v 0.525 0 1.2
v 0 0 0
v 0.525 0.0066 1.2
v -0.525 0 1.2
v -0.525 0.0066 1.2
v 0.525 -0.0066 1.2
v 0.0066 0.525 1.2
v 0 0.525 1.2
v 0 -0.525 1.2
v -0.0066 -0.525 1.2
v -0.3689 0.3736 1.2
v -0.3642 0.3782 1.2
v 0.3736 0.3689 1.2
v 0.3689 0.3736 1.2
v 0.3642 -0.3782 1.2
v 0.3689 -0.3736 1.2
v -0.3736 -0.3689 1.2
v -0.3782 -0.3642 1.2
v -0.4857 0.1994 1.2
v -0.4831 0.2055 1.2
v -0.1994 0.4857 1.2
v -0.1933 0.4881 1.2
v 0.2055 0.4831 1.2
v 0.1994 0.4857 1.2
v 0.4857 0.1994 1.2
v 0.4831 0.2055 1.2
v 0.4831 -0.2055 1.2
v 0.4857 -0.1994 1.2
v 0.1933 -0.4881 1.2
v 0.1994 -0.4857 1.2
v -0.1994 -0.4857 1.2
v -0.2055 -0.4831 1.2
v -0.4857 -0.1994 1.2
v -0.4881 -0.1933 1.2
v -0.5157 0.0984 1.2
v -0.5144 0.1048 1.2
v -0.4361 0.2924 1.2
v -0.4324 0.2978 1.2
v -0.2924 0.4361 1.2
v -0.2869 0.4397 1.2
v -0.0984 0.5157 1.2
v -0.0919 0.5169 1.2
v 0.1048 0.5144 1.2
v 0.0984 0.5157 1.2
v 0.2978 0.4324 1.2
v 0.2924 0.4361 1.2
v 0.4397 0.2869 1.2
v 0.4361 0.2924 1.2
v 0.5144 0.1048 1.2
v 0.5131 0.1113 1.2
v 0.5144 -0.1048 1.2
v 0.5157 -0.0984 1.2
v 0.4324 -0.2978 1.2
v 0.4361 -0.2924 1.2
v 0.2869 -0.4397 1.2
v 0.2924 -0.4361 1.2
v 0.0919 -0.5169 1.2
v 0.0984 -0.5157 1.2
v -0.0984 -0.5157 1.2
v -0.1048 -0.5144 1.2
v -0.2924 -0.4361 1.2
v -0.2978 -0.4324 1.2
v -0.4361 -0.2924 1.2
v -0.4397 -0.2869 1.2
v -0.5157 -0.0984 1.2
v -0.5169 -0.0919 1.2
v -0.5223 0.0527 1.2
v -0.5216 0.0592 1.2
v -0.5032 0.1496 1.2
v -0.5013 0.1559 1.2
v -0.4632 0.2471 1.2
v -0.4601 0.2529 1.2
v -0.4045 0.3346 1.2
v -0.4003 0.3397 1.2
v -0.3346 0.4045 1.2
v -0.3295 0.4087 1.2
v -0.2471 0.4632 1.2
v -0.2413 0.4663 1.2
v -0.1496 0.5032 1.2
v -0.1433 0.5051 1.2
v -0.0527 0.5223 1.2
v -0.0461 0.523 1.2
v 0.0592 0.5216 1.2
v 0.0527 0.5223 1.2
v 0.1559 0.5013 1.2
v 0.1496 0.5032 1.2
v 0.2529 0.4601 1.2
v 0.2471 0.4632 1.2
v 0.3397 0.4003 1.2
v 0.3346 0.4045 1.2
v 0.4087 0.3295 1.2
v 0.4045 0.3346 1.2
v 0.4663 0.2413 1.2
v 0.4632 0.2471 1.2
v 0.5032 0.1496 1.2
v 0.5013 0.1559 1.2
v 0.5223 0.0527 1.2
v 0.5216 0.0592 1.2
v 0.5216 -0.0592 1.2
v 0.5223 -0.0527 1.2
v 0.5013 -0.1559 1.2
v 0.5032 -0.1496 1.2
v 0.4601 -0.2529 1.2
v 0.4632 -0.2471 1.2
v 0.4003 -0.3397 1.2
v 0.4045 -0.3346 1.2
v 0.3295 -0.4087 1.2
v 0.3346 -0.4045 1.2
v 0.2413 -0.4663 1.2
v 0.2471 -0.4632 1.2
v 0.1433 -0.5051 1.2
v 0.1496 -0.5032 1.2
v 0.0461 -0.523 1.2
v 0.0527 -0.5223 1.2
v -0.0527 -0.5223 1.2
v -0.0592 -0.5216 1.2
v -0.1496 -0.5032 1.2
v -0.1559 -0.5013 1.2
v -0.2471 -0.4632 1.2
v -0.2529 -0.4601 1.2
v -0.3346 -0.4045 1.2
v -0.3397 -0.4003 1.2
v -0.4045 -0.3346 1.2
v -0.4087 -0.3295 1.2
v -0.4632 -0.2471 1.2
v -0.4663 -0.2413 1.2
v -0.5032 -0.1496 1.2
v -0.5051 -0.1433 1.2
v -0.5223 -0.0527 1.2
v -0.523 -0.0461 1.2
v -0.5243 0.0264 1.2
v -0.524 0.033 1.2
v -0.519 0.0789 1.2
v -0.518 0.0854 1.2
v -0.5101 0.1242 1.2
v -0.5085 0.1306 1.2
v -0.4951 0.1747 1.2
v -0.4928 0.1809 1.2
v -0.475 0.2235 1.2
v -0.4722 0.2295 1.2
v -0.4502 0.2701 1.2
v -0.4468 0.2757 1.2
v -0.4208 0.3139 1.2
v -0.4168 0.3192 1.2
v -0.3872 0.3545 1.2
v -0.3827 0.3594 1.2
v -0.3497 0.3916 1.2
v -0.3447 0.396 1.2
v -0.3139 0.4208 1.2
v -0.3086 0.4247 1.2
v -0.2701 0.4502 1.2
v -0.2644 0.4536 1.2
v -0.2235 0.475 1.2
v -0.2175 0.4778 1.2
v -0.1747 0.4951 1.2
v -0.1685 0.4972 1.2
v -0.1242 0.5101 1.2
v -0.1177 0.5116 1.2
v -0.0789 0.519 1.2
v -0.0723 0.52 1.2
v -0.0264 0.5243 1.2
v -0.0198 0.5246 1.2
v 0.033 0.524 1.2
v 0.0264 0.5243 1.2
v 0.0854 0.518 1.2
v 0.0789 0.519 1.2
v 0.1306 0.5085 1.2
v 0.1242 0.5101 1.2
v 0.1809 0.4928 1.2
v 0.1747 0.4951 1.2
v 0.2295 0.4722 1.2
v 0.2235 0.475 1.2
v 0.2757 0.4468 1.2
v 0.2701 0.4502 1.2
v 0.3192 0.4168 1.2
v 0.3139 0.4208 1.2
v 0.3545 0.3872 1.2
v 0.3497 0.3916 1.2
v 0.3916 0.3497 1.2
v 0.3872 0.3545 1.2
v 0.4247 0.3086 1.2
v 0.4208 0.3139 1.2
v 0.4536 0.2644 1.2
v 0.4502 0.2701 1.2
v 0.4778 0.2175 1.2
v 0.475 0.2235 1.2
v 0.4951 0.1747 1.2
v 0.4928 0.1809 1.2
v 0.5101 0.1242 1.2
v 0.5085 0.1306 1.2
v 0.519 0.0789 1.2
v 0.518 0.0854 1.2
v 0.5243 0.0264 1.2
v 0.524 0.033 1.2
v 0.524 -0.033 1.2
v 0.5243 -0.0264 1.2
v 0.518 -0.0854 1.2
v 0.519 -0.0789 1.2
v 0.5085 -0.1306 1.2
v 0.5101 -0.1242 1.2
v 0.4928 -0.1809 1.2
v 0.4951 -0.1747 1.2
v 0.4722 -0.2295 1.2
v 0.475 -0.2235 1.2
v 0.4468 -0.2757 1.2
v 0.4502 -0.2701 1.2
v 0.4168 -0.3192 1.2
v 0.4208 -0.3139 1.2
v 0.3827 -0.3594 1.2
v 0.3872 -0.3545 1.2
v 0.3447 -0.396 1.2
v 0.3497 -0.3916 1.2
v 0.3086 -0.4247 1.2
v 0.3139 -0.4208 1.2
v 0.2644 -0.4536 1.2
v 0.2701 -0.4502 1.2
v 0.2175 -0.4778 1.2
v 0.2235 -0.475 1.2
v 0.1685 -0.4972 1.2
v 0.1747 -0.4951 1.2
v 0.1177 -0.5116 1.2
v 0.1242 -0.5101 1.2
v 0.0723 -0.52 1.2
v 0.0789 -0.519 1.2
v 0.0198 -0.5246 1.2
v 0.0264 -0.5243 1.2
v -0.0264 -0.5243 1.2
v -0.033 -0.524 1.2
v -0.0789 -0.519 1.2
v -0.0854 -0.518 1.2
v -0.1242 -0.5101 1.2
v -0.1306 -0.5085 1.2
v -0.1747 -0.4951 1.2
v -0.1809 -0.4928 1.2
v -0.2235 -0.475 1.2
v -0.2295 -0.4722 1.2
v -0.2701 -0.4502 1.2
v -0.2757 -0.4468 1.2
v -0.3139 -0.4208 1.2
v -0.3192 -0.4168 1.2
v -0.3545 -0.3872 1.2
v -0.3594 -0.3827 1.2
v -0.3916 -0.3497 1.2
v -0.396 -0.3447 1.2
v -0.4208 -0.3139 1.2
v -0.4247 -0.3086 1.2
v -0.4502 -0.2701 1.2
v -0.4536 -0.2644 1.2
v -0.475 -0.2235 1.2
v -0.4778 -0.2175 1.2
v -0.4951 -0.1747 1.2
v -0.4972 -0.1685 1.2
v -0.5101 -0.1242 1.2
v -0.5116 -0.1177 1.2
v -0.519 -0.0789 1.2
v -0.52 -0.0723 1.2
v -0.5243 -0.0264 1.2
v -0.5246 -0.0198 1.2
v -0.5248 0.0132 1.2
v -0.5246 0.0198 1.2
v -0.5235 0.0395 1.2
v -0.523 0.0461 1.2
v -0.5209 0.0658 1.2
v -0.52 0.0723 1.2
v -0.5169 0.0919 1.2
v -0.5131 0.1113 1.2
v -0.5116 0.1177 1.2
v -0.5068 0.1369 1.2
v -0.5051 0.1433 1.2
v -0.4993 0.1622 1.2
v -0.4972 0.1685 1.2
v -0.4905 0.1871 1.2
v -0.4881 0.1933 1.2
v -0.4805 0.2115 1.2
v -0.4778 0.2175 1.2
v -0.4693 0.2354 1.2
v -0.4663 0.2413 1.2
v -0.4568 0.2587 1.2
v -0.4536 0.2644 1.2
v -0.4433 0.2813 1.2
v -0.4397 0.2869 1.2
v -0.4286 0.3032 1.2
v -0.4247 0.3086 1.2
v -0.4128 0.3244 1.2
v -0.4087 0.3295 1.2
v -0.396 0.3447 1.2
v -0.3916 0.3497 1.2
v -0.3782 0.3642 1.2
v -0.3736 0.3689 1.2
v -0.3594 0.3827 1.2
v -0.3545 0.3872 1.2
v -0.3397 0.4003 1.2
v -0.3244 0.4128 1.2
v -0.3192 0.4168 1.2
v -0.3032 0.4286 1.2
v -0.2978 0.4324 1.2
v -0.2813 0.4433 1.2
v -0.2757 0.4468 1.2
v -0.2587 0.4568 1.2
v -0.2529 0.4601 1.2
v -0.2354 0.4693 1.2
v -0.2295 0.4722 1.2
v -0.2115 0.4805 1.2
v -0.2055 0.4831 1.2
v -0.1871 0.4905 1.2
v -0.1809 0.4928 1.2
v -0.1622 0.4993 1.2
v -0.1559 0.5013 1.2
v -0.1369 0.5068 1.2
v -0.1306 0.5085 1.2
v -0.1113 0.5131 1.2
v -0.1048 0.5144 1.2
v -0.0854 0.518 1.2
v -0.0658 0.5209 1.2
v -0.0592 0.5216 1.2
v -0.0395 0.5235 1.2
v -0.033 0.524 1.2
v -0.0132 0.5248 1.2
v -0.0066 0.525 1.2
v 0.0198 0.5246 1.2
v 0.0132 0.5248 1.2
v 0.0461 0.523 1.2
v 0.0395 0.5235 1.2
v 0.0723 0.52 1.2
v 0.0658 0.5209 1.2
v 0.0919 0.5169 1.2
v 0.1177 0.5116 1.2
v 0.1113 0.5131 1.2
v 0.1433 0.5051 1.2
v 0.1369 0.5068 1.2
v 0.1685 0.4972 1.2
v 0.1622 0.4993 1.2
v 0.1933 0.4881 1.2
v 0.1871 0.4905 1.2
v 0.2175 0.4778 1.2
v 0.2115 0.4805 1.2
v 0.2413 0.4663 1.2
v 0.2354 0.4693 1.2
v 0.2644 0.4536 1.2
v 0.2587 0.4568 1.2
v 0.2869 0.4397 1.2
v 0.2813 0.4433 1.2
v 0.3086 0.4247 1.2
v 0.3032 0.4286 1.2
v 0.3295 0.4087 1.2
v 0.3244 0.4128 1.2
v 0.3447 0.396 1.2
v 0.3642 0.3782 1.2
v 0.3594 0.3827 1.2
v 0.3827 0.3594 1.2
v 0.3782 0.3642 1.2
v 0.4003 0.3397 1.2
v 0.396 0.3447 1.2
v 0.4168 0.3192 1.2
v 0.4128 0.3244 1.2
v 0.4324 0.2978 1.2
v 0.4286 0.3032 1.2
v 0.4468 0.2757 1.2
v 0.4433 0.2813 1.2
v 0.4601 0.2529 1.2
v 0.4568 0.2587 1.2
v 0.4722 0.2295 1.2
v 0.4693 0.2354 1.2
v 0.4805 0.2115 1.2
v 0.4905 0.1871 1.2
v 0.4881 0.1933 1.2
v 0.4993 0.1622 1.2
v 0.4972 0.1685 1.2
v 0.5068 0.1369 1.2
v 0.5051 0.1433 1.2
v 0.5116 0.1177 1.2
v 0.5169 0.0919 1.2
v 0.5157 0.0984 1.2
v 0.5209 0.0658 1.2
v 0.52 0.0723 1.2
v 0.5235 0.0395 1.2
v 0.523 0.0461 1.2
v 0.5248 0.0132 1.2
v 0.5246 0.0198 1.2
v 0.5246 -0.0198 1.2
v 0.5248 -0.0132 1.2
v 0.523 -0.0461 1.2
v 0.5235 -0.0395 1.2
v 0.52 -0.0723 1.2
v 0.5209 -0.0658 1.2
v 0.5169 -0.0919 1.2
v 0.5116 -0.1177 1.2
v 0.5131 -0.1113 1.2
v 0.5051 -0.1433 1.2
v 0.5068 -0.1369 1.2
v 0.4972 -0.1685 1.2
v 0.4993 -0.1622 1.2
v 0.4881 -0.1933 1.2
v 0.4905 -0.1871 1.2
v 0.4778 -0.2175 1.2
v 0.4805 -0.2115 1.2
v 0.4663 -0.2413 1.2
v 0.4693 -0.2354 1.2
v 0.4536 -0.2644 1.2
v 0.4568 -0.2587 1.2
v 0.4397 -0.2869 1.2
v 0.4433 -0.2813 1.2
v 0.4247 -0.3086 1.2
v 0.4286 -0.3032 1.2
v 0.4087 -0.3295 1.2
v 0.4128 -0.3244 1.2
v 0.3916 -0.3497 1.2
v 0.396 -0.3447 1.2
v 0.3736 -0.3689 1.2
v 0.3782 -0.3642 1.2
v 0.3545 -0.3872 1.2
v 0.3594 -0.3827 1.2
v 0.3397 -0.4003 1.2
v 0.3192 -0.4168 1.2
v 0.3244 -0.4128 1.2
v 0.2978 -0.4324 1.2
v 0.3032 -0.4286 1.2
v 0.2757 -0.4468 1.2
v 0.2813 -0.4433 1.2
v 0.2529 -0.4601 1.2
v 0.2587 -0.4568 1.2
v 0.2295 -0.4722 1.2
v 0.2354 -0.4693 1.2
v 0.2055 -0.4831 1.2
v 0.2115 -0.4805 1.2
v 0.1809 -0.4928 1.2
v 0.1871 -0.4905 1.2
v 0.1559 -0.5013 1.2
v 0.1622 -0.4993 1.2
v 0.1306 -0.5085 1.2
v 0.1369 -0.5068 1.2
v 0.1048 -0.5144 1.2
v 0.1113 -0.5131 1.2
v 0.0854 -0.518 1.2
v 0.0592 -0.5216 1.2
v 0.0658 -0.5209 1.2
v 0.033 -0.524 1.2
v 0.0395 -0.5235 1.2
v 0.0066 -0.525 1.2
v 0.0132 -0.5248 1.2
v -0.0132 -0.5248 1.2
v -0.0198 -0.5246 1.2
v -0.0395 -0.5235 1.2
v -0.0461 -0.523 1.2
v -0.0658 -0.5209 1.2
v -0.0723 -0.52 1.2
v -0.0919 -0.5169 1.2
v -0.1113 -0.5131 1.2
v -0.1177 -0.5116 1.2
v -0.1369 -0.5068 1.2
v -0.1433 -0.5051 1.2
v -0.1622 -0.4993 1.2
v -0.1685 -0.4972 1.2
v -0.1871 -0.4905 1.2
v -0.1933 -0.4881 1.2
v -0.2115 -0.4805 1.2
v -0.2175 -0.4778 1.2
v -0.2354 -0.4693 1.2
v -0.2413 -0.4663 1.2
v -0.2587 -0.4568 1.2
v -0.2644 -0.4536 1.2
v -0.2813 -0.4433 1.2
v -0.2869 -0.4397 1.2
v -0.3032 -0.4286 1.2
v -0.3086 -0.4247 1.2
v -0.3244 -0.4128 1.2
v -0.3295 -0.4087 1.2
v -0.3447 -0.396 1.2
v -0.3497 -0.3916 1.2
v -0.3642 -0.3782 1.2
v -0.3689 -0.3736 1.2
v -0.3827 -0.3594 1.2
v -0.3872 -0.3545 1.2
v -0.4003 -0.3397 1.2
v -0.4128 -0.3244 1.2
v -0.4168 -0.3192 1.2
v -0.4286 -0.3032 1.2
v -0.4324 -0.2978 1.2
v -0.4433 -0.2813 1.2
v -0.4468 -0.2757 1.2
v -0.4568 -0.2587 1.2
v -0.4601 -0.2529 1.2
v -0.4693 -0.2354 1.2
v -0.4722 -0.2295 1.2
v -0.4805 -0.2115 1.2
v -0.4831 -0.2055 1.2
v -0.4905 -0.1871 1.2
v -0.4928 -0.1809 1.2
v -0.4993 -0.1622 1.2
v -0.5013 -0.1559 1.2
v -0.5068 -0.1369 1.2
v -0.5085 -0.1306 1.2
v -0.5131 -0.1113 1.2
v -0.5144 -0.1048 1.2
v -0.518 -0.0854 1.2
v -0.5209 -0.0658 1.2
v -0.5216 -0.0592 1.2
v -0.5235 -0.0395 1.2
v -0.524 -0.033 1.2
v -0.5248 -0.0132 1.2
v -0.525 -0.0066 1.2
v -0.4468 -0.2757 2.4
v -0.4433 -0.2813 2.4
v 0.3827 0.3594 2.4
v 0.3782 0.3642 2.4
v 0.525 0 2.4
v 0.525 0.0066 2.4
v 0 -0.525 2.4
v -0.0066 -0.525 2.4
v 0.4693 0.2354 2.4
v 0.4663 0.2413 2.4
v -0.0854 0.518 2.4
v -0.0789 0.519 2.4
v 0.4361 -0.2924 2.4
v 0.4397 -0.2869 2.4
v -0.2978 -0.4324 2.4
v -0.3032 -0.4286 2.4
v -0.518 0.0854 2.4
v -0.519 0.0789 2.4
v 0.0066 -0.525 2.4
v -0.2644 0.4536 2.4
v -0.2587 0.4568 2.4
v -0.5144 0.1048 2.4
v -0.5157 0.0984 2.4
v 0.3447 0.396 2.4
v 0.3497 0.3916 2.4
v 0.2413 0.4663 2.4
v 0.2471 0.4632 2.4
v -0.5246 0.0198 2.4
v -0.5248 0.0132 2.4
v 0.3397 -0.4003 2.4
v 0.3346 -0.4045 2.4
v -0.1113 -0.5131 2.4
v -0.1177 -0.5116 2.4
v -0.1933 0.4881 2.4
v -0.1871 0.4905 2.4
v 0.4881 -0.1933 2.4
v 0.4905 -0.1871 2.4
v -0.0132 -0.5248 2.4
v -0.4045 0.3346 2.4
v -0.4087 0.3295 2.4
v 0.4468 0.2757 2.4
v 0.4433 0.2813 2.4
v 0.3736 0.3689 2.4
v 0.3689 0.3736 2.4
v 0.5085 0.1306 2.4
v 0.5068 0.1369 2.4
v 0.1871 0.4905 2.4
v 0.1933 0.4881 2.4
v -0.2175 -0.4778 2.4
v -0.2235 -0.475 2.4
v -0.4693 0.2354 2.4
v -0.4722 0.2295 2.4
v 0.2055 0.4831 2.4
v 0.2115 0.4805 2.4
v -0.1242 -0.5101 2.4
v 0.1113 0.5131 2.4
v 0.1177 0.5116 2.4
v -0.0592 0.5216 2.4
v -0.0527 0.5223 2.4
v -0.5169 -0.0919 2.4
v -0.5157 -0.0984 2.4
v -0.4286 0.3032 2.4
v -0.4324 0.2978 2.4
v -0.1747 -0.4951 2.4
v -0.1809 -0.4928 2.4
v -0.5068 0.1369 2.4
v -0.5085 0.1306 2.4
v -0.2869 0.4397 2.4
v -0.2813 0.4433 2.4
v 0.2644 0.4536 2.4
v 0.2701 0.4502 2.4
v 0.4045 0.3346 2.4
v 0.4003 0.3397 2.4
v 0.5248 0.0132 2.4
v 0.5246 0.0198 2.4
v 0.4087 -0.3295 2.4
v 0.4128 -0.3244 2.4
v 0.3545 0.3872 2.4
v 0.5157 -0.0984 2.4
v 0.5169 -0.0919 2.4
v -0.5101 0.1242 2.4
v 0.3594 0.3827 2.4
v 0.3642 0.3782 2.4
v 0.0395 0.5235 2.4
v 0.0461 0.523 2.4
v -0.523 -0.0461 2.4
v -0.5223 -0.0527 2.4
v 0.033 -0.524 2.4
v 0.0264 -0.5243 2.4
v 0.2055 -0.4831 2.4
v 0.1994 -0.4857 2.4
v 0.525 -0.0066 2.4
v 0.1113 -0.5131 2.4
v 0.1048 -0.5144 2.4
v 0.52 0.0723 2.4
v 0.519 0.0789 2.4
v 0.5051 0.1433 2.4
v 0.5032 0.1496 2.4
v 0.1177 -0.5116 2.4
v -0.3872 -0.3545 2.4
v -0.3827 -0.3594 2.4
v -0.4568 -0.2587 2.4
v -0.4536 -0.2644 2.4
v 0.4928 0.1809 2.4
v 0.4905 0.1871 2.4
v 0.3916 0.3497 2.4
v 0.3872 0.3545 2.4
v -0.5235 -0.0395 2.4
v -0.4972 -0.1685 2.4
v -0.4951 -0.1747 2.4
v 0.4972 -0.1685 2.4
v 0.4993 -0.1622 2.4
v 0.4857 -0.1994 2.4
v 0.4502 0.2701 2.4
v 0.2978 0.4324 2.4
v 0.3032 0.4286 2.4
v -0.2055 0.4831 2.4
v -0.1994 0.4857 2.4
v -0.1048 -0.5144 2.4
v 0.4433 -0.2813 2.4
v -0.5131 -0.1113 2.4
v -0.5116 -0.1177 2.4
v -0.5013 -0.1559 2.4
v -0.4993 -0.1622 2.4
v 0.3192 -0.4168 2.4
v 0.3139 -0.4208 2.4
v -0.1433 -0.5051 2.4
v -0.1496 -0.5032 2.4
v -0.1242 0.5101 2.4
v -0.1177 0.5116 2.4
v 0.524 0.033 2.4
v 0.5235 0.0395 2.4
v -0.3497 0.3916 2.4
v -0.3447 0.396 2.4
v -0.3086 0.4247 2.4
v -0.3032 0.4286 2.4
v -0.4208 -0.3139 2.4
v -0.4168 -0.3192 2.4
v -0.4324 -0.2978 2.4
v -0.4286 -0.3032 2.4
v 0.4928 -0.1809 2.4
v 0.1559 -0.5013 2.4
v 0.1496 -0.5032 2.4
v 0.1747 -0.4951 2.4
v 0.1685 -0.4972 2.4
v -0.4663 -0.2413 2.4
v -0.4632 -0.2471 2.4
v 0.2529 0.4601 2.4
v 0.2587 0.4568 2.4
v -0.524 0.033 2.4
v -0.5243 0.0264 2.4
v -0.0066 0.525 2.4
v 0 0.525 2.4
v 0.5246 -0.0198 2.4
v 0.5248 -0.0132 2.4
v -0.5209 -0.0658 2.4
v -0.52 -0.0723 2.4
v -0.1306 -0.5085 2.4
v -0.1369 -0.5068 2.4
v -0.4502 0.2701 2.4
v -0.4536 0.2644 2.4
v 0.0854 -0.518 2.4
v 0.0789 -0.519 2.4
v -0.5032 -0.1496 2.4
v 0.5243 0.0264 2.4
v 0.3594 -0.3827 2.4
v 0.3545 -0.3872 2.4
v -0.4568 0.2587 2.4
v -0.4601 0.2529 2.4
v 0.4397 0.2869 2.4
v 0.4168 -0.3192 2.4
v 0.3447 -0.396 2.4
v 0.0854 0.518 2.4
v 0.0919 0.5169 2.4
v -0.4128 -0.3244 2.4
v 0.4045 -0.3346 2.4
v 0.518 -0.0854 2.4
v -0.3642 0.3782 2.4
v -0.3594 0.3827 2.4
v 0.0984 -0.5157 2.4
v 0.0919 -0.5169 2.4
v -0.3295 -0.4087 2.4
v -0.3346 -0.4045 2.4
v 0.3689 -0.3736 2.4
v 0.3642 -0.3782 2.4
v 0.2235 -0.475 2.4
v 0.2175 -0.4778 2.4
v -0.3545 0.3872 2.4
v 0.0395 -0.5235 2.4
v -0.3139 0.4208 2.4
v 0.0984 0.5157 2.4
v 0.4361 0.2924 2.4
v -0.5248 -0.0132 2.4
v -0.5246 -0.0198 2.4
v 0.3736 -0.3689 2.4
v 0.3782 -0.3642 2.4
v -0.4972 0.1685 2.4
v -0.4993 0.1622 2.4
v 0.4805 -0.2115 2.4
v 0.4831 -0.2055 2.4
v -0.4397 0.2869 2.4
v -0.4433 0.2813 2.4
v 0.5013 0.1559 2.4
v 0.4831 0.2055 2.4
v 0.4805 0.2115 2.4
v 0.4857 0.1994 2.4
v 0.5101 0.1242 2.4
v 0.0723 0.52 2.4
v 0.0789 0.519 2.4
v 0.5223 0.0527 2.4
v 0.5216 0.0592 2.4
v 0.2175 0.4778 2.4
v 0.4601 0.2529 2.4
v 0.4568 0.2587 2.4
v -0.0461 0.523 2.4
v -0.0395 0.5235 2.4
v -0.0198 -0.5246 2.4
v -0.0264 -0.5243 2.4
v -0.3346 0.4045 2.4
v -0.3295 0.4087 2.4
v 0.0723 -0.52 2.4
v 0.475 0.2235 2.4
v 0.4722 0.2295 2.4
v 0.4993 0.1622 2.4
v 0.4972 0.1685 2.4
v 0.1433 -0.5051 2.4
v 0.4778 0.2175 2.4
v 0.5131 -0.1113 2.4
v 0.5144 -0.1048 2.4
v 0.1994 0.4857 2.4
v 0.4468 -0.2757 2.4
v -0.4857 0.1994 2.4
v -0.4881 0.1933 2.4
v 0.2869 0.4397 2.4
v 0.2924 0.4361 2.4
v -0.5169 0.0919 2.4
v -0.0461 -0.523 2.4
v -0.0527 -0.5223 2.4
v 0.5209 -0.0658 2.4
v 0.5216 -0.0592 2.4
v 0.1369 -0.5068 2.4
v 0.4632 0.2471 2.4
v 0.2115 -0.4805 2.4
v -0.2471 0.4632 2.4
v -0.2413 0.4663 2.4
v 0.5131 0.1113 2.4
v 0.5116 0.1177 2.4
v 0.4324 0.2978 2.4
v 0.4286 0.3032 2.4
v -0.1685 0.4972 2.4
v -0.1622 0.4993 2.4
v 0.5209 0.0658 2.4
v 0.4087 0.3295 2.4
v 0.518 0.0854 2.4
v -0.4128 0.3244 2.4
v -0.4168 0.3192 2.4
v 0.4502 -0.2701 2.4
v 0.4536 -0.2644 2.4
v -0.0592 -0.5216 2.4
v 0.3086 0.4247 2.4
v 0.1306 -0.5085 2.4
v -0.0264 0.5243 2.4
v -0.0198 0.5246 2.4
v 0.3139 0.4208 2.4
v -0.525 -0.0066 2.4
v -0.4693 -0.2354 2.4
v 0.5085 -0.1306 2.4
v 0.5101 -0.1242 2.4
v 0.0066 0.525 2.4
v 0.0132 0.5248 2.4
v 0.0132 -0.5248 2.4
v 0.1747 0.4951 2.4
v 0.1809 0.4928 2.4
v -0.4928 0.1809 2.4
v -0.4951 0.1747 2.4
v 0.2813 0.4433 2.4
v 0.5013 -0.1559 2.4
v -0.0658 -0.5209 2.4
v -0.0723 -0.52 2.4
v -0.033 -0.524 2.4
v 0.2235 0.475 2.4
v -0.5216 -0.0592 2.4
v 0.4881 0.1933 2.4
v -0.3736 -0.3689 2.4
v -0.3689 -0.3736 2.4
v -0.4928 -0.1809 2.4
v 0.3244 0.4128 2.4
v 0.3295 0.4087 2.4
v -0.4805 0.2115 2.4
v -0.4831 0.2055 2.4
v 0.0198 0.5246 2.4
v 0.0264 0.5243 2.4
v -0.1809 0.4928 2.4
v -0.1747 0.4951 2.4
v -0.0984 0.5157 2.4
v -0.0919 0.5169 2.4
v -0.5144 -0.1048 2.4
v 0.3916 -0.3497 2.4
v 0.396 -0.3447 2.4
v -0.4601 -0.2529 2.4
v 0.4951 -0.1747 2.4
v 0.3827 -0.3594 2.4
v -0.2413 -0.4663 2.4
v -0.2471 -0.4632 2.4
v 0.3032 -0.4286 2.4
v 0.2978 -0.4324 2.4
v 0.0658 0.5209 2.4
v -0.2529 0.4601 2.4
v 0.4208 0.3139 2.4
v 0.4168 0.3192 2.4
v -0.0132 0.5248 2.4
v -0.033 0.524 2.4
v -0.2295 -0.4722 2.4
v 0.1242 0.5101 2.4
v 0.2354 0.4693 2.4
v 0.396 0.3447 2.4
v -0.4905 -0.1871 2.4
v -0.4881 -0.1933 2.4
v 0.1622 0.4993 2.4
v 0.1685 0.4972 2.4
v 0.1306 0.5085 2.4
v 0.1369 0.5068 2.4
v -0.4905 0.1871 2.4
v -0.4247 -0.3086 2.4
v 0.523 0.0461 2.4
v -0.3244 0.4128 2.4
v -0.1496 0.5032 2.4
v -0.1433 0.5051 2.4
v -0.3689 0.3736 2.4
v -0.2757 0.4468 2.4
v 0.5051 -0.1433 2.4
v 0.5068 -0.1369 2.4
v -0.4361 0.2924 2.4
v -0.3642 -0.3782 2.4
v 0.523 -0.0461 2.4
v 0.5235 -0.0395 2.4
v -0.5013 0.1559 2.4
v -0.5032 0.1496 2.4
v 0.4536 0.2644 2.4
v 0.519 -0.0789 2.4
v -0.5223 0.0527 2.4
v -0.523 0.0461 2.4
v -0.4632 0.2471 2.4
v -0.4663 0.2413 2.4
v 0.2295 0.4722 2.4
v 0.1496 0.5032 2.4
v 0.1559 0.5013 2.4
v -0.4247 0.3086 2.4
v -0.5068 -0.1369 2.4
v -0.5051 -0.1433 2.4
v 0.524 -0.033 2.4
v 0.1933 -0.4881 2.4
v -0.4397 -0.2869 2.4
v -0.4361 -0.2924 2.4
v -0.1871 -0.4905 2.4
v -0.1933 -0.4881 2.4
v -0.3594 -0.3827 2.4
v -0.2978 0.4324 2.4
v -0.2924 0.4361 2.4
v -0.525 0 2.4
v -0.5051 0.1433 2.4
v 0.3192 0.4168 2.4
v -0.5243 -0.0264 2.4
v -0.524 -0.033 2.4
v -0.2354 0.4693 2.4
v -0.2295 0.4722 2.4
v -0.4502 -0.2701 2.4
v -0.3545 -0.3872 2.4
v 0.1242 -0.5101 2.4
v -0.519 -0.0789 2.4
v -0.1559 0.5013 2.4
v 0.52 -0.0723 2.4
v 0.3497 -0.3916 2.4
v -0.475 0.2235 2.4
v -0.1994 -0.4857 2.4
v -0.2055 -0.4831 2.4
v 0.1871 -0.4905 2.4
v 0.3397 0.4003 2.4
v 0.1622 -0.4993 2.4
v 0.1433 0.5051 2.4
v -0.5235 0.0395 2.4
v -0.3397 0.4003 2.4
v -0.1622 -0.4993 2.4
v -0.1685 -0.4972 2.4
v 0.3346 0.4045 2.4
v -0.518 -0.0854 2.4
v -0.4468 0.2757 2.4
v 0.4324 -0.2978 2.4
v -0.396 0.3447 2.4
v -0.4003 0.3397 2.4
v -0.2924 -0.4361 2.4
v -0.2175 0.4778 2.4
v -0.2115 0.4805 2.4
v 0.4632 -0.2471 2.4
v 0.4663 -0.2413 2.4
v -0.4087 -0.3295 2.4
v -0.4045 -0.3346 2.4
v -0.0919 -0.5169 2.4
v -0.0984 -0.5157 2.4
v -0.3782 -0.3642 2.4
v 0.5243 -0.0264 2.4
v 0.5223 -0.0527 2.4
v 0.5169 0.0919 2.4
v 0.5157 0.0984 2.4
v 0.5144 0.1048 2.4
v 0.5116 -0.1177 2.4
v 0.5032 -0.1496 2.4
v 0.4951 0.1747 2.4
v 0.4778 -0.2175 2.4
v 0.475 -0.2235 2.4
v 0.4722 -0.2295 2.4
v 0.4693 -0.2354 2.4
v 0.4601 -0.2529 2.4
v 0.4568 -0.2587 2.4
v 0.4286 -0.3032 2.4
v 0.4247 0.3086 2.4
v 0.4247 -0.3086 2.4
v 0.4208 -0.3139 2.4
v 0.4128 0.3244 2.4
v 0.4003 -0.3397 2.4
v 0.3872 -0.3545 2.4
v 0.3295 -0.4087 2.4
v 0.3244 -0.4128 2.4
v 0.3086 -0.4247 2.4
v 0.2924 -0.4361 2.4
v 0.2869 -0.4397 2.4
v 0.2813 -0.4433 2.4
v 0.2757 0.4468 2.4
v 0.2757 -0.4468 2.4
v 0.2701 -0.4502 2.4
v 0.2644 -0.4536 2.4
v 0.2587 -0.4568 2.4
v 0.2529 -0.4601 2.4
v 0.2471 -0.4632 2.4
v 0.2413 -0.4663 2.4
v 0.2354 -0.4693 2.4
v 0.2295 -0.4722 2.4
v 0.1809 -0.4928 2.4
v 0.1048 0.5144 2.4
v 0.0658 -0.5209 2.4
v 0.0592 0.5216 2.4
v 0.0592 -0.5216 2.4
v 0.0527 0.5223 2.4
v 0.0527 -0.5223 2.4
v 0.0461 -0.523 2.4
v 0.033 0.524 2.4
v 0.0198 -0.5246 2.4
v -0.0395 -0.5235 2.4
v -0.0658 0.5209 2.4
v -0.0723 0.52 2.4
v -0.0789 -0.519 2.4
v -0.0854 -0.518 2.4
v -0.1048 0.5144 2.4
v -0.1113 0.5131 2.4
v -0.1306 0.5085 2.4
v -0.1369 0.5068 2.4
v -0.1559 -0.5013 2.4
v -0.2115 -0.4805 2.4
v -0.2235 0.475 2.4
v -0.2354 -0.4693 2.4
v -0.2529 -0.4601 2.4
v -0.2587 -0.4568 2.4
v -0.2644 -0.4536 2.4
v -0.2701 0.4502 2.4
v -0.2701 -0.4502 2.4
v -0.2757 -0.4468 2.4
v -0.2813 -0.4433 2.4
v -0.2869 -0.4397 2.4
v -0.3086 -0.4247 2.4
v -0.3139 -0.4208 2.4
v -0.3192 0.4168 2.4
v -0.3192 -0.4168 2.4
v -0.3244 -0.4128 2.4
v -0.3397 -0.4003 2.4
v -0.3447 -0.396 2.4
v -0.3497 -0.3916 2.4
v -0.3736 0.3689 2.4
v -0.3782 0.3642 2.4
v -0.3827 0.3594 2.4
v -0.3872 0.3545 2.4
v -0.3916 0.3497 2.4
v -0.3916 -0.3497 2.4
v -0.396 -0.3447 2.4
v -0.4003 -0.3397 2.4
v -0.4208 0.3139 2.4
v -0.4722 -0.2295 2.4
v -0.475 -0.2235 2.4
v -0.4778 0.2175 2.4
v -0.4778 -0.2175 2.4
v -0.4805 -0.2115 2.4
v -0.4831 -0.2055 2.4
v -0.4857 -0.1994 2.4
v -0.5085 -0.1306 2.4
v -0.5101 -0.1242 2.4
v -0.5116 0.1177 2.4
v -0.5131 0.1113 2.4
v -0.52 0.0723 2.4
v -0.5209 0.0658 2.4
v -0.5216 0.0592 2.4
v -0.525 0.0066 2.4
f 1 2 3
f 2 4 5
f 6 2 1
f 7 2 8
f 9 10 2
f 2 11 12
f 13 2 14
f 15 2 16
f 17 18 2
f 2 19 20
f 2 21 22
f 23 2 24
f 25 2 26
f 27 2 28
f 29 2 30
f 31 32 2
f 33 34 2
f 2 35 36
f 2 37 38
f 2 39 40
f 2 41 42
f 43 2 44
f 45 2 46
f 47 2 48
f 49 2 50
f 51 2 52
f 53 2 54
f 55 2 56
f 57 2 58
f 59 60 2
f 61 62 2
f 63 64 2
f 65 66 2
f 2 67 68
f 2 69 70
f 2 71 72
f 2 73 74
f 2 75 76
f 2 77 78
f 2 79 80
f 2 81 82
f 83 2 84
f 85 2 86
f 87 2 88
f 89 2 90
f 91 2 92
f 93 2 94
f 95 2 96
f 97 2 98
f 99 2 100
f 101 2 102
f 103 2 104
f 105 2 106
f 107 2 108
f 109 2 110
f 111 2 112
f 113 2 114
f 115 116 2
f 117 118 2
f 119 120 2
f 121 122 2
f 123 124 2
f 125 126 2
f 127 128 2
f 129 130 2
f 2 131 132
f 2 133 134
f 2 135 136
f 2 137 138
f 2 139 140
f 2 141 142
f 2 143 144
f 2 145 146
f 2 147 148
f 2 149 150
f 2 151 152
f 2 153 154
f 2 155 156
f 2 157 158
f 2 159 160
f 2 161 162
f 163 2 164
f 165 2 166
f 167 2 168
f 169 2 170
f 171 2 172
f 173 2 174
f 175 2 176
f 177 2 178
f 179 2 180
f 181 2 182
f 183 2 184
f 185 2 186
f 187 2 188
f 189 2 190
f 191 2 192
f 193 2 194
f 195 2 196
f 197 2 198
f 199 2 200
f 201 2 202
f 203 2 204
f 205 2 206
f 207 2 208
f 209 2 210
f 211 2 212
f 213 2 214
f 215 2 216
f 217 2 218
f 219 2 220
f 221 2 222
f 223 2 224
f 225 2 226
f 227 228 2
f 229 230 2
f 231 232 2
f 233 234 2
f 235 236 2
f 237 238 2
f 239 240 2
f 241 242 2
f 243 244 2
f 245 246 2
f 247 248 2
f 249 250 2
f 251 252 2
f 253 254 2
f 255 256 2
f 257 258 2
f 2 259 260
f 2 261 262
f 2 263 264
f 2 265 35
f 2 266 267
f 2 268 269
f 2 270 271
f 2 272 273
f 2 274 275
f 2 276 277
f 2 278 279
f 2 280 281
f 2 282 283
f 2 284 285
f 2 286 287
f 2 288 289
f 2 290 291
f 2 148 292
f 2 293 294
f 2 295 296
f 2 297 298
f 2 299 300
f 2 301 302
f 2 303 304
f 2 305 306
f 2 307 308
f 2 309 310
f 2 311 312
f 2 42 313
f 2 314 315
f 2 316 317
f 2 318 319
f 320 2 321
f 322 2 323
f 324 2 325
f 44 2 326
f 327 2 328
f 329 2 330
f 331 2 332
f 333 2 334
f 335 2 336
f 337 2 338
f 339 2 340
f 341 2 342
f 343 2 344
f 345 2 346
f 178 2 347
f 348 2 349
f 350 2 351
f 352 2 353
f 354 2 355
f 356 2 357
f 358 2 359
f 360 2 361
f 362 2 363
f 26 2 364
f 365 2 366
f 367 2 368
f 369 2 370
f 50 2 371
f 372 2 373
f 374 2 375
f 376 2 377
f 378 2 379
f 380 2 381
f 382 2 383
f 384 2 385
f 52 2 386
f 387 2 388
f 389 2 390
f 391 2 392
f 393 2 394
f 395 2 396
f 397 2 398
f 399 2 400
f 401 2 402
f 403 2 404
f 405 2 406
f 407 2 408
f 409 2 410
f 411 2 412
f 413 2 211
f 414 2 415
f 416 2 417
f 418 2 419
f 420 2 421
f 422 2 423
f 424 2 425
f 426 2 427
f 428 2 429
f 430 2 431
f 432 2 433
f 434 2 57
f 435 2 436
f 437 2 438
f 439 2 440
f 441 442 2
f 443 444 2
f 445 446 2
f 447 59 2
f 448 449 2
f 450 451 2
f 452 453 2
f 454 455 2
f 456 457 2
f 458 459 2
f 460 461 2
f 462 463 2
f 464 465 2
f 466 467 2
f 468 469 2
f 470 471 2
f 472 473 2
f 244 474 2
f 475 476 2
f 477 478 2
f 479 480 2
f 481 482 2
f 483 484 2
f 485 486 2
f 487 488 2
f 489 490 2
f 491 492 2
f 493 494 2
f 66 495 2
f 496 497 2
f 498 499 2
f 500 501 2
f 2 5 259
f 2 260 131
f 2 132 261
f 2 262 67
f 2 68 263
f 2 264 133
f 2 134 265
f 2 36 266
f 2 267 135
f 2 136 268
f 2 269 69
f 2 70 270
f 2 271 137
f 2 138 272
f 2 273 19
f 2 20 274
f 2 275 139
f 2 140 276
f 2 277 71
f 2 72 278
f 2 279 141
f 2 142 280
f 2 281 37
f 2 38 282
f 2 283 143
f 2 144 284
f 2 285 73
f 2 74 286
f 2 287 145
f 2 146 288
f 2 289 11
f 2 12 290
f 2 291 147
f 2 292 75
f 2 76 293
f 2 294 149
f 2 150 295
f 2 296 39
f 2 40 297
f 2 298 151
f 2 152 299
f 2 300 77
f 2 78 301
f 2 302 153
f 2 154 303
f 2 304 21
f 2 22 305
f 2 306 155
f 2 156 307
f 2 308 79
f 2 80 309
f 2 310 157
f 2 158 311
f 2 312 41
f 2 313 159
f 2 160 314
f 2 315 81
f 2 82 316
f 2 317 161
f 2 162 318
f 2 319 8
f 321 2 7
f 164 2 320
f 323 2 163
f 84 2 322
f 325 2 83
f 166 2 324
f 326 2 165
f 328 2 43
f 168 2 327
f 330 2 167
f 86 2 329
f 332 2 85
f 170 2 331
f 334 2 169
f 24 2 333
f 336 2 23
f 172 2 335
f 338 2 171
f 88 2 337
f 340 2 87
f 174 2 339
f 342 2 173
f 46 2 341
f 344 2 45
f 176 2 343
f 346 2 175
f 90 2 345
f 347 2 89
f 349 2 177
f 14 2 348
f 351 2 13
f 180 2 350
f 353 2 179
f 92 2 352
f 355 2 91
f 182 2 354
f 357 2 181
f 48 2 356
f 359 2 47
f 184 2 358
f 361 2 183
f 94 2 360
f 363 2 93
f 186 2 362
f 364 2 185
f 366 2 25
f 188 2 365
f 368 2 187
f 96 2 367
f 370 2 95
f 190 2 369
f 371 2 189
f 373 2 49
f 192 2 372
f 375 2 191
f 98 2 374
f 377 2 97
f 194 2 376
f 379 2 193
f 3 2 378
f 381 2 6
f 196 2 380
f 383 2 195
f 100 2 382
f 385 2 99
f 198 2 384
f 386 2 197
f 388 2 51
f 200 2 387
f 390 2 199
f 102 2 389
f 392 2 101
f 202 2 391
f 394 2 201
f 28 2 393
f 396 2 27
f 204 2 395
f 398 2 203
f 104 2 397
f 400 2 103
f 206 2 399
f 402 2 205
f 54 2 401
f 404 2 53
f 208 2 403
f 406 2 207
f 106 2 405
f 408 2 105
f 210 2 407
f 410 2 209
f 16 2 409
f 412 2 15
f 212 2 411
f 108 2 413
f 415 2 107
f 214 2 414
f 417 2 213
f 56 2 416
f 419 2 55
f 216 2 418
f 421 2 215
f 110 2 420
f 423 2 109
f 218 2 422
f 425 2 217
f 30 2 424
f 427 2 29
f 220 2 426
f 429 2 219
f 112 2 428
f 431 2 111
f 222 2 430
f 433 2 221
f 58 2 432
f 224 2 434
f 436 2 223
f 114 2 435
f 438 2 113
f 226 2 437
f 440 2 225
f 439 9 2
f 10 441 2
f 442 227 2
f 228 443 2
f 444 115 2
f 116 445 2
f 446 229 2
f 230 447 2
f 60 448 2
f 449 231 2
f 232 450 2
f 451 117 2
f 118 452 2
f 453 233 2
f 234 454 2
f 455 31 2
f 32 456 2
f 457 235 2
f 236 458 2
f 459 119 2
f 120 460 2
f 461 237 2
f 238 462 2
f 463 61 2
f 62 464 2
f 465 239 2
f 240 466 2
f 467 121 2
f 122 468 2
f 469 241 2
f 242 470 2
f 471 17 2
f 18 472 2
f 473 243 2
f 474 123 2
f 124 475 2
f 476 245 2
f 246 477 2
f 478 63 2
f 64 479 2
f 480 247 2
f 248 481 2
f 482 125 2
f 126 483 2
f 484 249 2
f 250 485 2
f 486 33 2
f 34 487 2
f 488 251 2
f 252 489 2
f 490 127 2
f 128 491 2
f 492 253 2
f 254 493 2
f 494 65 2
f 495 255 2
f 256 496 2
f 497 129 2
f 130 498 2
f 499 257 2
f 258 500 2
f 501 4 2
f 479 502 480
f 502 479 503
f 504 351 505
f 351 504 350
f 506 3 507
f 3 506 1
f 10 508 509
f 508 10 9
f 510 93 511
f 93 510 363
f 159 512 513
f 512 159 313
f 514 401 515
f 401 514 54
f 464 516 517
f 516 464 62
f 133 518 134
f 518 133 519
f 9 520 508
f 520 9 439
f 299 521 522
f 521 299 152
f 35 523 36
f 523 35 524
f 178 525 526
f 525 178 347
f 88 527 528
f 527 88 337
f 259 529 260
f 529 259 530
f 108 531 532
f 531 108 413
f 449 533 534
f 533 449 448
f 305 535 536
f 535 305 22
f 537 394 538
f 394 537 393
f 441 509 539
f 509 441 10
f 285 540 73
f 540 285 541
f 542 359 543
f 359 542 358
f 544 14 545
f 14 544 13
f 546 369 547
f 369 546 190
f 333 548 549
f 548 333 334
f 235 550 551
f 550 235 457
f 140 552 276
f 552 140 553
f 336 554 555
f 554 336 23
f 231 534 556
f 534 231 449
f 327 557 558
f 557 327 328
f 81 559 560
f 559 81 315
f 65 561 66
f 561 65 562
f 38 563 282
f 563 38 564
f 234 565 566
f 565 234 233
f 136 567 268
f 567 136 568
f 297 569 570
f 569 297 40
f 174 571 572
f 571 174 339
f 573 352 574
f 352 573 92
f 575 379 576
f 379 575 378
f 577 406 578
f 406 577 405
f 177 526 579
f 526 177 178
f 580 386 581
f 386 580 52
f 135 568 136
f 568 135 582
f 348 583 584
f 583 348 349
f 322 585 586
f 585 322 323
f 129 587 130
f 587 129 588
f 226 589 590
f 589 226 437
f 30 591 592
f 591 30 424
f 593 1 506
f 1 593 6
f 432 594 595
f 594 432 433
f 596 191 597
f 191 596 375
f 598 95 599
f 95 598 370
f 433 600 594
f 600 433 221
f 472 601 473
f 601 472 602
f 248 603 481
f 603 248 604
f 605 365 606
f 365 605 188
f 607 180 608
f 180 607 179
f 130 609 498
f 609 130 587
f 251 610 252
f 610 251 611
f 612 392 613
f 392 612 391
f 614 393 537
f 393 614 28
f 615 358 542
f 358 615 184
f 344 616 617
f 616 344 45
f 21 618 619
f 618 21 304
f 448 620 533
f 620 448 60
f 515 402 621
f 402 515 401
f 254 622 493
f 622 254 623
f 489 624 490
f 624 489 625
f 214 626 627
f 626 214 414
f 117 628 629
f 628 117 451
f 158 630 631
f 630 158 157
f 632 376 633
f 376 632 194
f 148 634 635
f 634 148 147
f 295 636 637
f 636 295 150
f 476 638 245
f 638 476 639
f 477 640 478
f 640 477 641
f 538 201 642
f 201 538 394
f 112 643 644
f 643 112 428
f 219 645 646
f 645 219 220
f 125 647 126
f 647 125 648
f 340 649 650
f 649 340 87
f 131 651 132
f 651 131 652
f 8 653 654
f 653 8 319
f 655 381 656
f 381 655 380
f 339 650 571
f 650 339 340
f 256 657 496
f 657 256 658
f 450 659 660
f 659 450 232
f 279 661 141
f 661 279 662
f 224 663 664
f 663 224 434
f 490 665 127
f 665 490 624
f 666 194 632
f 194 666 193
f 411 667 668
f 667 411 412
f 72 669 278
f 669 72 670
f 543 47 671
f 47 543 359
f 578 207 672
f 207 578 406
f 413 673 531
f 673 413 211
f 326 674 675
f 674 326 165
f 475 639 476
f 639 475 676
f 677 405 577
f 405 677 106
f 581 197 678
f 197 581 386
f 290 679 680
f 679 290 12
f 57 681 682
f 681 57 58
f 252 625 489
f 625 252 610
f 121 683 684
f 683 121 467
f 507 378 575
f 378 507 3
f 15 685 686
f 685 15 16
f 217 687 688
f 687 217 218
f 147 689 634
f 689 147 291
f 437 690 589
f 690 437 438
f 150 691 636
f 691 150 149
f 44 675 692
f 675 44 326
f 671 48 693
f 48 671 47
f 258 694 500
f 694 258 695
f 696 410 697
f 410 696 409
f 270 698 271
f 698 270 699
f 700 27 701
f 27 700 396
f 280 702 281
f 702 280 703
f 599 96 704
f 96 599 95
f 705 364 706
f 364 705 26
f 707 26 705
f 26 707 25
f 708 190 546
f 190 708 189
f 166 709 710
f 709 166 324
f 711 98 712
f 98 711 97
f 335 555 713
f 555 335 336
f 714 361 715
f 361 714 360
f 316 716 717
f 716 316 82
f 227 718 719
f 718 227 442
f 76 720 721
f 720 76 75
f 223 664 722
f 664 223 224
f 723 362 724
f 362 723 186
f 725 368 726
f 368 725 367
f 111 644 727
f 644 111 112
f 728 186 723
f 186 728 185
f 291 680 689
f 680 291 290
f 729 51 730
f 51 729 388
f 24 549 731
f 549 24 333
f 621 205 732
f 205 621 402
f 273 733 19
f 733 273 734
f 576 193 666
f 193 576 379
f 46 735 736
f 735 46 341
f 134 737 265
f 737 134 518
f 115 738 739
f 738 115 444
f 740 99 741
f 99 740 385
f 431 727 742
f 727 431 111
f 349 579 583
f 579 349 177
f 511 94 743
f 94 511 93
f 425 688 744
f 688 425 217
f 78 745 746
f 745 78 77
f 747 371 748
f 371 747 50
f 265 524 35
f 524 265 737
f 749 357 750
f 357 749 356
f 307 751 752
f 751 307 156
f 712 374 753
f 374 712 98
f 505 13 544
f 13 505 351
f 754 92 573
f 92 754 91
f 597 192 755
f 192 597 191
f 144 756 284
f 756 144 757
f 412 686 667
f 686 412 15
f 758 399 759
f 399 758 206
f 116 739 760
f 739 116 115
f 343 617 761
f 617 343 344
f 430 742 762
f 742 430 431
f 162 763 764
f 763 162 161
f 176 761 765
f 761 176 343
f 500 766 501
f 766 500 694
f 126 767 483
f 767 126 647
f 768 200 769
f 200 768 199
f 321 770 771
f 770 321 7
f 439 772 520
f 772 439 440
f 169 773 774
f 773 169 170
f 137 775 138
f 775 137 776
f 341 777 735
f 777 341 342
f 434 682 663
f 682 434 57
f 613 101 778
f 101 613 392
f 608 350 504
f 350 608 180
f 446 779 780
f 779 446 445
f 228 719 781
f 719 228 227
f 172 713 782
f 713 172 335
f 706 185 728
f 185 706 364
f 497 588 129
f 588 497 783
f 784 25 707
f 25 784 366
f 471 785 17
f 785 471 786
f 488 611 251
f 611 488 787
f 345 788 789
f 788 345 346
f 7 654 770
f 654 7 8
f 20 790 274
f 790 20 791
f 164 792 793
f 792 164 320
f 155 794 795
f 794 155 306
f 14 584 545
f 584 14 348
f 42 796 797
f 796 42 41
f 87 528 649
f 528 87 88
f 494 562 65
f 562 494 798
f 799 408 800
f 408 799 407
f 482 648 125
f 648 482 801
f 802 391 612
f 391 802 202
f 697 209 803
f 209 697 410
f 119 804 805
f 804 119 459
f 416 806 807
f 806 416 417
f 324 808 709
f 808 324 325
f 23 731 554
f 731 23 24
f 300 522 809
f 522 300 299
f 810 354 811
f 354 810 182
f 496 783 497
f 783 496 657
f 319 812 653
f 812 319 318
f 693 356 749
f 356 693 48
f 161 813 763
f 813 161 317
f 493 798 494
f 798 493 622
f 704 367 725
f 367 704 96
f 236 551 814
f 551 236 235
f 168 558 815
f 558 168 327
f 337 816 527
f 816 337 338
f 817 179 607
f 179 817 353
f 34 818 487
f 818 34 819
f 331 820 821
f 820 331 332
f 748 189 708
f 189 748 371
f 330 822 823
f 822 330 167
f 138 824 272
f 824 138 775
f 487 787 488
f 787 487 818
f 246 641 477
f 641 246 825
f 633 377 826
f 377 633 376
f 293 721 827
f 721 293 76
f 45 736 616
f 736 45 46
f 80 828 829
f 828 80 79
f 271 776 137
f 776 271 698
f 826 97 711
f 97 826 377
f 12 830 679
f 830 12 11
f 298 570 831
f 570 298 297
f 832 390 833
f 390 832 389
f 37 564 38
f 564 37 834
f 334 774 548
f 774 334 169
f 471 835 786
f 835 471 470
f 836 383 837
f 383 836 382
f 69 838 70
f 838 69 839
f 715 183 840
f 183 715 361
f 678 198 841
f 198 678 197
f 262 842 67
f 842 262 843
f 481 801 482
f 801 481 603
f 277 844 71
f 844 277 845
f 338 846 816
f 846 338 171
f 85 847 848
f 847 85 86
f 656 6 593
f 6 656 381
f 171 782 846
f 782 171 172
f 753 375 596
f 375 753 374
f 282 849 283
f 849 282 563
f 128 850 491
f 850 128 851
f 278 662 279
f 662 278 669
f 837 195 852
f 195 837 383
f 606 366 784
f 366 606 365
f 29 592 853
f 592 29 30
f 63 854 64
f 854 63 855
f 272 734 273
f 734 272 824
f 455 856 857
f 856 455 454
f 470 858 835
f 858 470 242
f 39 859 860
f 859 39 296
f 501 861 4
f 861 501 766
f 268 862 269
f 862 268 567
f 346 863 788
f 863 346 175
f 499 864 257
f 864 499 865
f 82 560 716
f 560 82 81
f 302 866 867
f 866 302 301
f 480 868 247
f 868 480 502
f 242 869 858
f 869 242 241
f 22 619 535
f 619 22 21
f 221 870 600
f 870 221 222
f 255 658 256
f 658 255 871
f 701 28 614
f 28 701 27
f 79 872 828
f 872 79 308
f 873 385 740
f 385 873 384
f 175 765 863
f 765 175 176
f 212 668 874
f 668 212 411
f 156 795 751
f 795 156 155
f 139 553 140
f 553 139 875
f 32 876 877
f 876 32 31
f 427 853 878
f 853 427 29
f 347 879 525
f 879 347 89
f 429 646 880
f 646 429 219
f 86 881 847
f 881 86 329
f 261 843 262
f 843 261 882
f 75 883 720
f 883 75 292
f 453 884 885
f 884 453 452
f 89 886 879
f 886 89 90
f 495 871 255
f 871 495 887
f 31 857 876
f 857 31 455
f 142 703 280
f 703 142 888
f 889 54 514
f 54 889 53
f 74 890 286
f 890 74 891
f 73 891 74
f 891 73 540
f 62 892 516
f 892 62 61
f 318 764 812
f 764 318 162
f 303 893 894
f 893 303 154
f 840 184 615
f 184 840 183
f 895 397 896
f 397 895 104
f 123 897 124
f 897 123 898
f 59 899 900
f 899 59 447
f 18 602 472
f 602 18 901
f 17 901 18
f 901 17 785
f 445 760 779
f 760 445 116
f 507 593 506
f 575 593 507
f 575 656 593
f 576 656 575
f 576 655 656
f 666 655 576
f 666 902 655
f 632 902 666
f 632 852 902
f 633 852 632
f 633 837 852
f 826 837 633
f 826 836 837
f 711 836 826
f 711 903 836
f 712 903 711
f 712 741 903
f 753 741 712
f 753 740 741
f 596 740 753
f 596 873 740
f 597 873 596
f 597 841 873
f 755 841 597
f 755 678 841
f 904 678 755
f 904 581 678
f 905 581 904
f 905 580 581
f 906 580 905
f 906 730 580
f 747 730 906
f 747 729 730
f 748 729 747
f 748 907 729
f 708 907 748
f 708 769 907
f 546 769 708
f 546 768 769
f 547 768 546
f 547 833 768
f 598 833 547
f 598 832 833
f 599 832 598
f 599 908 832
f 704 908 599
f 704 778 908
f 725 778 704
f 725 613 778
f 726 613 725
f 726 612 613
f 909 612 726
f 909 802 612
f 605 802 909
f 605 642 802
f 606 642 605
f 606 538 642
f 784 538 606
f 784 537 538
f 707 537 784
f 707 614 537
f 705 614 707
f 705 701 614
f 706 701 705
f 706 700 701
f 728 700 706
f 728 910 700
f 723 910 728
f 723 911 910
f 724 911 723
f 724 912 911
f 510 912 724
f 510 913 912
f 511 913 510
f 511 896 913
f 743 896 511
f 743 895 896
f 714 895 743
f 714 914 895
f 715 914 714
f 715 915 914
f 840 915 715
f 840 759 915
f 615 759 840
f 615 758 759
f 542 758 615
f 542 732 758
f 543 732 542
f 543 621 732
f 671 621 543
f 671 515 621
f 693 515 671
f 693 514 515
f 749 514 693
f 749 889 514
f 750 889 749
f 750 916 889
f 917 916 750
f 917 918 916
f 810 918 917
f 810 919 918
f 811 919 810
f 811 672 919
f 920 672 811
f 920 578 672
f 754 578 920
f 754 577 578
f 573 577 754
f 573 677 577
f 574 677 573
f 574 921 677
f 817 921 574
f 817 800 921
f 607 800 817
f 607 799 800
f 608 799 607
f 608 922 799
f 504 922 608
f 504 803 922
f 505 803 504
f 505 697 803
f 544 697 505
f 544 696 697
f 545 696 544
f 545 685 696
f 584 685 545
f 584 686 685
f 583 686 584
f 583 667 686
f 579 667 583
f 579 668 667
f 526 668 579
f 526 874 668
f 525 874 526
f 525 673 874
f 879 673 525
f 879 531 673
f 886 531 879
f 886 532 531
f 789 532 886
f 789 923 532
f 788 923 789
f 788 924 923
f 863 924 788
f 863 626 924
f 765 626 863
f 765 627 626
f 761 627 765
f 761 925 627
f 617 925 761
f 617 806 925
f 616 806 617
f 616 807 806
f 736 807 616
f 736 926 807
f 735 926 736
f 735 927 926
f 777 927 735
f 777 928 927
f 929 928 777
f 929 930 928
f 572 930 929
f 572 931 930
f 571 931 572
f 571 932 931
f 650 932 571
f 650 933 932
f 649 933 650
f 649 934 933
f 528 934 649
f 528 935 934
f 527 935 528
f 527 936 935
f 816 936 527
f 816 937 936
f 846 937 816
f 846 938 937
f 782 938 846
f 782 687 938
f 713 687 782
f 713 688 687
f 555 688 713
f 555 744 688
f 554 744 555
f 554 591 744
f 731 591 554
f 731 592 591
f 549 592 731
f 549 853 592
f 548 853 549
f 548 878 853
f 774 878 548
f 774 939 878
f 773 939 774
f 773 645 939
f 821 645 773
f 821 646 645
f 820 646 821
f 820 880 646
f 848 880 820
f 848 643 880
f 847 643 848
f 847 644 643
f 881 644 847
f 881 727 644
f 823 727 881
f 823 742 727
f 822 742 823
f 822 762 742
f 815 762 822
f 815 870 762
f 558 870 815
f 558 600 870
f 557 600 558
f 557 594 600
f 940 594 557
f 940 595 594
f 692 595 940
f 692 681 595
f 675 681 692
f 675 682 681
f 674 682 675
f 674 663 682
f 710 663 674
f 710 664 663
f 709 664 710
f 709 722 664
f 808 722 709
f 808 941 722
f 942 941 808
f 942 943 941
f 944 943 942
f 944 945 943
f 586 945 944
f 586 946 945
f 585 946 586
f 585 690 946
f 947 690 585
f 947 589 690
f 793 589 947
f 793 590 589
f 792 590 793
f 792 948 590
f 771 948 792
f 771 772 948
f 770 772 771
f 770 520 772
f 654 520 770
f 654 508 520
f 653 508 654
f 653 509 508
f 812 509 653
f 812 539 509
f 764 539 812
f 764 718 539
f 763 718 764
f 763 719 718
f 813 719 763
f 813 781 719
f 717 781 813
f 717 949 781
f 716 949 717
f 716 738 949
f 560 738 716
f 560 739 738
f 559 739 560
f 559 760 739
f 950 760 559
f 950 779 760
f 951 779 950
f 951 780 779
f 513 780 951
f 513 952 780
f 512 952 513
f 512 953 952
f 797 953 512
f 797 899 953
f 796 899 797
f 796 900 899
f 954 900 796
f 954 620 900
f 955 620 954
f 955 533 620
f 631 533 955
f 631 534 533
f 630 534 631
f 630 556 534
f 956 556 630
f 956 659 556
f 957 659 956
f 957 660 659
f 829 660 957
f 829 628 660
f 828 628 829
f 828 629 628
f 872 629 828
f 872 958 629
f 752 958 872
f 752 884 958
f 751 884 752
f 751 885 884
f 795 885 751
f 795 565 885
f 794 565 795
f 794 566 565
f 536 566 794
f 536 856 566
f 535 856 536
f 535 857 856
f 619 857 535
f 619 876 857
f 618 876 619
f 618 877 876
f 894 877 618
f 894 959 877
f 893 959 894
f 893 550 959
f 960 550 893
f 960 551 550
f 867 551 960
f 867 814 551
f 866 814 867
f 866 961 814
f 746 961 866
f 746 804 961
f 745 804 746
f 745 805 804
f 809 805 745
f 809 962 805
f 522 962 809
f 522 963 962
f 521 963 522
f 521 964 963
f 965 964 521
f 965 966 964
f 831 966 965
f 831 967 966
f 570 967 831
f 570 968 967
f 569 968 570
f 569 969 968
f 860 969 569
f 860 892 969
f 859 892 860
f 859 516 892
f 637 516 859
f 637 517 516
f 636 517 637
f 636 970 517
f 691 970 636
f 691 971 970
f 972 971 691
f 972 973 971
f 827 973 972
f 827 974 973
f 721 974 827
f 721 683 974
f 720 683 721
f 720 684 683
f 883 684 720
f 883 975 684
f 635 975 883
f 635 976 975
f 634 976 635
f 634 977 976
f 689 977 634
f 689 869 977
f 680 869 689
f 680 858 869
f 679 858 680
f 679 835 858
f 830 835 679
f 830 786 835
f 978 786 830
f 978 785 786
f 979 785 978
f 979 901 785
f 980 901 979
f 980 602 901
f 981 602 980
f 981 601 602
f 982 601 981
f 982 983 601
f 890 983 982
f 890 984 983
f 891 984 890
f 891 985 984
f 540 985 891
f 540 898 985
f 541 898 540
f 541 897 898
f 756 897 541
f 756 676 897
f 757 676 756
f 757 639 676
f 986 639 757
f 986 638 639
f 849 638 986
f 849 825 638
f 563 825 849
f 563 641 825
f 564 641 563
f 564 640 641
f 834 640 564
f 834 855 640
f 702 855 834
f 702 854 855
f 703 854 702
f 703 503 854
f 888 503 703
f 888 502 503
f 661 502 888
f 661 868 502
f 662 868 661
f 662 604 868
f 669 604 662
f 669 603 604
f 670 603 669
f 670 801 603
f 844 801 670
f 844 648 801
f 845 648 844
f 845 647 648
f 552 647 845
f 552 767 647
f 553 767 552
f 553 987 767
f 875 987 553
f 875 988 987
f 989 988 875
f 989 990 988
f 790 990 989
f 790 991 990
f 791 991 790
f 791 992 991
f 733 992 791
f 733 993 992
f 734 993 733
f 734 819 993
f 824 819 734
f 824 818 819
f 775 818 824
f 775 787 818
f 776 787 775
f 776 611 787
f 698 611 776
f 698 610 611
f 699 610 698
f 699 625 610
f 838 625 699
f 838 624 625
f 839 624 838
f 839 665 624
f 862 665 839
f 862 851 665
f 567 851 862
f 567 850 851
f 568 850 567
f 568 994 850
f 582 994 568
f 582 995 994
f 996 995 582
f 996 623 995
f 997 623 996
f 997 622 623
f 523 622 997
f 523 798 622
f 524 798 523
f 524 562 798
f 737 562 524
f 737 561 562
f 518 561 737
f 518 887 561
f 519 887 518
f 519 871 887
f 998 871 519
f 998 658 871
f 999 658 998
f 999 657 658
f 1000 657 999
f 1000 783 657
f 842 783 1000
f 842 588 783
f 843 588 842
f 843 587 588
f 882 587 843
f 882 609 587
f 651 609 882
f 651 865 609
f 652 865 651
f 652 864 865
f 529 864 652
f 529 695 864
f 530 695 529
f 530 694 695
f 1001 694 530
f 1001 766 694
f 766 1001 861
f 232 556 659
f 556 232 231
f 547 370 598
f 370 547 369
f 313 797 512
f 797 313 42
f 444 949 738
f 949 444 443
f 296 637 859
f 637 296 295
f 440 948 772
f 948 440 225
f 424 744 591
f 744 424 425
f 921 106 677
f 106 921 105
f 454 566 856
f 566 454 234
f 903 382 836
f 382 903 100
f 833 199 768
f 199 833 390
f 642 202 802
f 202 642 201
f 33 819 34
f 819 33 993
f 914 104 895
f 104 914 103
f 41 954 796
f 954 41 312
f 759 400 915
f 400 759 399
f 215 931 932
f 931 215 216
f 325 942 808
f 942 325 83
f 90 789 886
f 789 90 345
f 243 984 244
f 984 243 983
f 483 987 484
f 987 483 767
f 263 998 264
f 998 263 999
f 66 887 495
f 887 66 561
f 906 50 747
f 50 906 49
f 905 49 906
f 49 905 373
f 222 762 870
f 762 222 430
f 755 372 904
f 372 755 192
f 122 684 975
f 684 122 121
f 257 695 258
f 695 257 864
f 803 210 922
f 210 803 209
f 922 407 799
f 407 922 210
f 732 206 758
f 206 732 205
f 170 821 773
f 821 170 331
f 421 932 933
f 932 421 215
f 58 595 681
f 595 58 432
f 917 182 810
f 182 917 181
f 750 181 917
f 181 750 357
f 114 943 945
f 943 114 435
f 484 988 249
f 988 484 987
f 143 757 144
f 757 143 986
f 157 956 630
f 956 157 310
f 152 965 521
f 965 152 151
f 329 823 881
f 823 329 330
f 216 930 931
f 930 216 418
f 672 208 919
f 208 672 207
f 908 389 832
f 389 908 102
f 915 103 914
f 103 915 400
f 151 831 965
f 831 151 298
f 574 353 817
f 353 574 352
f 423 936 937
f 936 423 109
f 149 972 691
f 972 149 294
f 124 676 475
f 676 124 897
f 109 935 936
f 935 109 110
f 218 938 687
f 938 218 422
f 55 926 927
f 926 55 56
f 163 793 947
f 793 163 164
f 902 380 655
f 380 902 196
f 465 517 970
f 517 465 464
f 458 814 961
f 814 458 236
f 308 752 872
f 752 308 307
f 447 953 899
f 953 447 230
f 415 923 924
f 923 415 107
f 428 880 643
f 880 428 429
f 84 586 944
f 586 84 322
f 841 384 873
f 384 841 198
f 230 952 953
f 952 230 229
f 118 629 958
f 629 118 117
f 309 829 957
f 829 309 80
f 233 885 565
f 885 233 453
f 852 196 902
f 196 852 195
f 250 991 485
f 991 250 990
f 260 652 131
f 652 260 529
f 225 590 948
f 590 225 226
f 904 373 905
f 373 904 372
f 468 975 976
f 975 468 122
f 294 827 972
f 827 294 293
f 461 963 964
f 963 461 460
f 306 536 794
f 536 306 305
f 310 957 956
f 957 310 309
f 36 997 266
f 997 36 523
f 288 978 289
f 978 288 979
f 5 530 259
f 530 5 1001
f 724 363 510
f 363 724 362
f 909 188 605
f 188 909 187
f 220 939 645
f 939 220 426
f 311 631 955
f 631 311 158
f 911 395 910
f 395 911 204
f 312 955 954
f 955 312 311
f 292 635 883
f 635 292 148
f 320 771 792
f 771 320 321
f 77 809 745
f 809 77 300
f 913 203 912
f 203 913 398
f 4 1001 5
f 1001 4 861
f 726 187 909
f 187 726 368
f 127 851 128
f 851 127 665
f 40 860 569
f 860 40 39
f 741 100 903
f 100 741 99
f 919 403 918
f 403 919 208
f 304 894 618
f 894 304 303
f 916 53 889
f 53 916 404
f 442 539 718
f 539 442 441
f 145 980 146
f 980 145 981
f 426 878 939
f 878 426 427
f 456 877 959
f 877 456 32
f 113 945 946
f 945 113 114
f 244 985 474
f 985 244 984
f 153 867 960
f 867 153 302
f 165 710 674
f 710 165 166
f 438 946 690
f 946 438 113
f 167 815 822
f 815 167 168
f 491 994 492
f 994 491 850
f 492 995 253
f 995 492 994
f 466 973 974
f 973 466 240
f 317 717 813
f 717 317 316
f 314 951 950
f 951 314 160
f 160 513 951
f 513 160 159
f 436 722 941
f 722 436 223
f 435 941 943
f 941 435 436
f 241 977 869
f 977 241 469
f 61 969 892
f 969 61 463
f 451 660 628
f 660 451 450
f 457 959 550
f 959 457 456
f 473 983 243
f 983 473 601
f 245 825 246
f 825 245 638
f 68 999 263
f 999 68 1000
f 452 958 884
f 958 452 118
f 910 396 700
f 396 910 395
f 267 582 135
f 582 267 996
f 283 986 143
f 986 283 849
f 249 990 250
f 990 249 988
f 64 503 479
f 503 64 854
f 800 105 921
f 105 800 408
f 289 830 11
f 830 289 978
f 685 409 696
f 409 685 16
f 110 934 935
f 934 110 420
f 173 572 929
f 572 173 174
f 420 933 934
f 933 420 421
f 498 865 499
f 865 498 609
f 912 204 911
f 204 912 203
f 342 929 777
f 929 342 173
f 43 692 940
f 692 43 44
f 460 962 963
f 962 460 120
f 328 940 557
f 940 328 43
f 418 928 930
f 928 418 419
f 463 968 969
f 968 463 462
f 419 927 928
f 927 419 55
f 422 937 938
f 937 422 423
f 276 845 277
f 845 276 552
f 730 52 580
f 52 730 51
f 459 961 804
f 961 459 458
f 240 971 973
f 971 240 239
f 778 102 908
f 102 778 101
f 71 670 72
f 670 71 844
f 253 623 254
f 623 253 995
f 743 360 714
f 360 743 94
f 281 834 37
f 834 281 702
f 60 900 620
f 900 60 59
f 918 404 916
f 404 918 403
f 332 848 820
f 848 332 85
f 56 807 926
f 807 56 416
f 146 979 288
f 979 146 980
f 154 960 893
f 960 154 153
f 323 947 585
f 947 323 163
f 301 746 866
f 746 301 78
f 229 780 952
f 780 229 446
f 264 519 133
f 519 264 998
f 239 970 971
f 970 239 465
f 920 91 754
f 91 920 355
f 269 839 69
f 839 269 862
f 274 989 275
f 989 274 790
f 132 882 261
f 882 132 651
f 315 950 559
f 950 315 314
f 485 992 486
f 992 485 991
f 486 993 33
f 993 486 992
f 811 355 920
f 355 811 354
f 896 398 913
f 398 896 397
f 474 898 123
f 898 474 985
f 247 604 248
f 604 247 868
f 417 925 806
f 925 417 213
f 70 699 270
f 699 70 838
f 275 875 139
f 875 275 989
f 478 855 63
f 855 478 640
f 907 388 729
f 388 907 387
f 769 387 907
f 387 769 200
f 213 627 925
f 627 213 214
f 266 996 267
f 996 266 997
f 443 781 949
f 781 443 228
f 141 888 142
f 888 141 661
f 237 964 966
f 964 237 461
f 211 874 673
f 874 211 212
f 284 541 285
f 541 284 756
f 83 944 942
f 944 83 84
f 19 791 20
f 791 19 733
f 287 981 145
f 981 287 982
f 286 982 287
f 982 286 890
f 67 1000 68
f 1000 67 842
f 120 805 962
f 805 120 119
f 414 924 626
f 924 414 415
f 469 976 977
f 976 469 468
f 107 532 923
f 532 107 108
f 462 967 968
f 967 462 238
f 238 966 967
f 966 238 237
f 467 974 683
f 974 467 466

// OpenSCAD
// openscad - -o - --export-format binstl <_/light.scad >_/lightcone.stl

cylinder(h=1.2, d1=0, d2=1.05, center=false, $fn=500);
// translate([0,0,-1.2])
//     cylinder(h=1.2, d1=0.5, d2=0, center=false, $fn=500);
translate([0,0,1.2])
    cylinder(h=1.2, d=1.05, center=false, $fn=500);
